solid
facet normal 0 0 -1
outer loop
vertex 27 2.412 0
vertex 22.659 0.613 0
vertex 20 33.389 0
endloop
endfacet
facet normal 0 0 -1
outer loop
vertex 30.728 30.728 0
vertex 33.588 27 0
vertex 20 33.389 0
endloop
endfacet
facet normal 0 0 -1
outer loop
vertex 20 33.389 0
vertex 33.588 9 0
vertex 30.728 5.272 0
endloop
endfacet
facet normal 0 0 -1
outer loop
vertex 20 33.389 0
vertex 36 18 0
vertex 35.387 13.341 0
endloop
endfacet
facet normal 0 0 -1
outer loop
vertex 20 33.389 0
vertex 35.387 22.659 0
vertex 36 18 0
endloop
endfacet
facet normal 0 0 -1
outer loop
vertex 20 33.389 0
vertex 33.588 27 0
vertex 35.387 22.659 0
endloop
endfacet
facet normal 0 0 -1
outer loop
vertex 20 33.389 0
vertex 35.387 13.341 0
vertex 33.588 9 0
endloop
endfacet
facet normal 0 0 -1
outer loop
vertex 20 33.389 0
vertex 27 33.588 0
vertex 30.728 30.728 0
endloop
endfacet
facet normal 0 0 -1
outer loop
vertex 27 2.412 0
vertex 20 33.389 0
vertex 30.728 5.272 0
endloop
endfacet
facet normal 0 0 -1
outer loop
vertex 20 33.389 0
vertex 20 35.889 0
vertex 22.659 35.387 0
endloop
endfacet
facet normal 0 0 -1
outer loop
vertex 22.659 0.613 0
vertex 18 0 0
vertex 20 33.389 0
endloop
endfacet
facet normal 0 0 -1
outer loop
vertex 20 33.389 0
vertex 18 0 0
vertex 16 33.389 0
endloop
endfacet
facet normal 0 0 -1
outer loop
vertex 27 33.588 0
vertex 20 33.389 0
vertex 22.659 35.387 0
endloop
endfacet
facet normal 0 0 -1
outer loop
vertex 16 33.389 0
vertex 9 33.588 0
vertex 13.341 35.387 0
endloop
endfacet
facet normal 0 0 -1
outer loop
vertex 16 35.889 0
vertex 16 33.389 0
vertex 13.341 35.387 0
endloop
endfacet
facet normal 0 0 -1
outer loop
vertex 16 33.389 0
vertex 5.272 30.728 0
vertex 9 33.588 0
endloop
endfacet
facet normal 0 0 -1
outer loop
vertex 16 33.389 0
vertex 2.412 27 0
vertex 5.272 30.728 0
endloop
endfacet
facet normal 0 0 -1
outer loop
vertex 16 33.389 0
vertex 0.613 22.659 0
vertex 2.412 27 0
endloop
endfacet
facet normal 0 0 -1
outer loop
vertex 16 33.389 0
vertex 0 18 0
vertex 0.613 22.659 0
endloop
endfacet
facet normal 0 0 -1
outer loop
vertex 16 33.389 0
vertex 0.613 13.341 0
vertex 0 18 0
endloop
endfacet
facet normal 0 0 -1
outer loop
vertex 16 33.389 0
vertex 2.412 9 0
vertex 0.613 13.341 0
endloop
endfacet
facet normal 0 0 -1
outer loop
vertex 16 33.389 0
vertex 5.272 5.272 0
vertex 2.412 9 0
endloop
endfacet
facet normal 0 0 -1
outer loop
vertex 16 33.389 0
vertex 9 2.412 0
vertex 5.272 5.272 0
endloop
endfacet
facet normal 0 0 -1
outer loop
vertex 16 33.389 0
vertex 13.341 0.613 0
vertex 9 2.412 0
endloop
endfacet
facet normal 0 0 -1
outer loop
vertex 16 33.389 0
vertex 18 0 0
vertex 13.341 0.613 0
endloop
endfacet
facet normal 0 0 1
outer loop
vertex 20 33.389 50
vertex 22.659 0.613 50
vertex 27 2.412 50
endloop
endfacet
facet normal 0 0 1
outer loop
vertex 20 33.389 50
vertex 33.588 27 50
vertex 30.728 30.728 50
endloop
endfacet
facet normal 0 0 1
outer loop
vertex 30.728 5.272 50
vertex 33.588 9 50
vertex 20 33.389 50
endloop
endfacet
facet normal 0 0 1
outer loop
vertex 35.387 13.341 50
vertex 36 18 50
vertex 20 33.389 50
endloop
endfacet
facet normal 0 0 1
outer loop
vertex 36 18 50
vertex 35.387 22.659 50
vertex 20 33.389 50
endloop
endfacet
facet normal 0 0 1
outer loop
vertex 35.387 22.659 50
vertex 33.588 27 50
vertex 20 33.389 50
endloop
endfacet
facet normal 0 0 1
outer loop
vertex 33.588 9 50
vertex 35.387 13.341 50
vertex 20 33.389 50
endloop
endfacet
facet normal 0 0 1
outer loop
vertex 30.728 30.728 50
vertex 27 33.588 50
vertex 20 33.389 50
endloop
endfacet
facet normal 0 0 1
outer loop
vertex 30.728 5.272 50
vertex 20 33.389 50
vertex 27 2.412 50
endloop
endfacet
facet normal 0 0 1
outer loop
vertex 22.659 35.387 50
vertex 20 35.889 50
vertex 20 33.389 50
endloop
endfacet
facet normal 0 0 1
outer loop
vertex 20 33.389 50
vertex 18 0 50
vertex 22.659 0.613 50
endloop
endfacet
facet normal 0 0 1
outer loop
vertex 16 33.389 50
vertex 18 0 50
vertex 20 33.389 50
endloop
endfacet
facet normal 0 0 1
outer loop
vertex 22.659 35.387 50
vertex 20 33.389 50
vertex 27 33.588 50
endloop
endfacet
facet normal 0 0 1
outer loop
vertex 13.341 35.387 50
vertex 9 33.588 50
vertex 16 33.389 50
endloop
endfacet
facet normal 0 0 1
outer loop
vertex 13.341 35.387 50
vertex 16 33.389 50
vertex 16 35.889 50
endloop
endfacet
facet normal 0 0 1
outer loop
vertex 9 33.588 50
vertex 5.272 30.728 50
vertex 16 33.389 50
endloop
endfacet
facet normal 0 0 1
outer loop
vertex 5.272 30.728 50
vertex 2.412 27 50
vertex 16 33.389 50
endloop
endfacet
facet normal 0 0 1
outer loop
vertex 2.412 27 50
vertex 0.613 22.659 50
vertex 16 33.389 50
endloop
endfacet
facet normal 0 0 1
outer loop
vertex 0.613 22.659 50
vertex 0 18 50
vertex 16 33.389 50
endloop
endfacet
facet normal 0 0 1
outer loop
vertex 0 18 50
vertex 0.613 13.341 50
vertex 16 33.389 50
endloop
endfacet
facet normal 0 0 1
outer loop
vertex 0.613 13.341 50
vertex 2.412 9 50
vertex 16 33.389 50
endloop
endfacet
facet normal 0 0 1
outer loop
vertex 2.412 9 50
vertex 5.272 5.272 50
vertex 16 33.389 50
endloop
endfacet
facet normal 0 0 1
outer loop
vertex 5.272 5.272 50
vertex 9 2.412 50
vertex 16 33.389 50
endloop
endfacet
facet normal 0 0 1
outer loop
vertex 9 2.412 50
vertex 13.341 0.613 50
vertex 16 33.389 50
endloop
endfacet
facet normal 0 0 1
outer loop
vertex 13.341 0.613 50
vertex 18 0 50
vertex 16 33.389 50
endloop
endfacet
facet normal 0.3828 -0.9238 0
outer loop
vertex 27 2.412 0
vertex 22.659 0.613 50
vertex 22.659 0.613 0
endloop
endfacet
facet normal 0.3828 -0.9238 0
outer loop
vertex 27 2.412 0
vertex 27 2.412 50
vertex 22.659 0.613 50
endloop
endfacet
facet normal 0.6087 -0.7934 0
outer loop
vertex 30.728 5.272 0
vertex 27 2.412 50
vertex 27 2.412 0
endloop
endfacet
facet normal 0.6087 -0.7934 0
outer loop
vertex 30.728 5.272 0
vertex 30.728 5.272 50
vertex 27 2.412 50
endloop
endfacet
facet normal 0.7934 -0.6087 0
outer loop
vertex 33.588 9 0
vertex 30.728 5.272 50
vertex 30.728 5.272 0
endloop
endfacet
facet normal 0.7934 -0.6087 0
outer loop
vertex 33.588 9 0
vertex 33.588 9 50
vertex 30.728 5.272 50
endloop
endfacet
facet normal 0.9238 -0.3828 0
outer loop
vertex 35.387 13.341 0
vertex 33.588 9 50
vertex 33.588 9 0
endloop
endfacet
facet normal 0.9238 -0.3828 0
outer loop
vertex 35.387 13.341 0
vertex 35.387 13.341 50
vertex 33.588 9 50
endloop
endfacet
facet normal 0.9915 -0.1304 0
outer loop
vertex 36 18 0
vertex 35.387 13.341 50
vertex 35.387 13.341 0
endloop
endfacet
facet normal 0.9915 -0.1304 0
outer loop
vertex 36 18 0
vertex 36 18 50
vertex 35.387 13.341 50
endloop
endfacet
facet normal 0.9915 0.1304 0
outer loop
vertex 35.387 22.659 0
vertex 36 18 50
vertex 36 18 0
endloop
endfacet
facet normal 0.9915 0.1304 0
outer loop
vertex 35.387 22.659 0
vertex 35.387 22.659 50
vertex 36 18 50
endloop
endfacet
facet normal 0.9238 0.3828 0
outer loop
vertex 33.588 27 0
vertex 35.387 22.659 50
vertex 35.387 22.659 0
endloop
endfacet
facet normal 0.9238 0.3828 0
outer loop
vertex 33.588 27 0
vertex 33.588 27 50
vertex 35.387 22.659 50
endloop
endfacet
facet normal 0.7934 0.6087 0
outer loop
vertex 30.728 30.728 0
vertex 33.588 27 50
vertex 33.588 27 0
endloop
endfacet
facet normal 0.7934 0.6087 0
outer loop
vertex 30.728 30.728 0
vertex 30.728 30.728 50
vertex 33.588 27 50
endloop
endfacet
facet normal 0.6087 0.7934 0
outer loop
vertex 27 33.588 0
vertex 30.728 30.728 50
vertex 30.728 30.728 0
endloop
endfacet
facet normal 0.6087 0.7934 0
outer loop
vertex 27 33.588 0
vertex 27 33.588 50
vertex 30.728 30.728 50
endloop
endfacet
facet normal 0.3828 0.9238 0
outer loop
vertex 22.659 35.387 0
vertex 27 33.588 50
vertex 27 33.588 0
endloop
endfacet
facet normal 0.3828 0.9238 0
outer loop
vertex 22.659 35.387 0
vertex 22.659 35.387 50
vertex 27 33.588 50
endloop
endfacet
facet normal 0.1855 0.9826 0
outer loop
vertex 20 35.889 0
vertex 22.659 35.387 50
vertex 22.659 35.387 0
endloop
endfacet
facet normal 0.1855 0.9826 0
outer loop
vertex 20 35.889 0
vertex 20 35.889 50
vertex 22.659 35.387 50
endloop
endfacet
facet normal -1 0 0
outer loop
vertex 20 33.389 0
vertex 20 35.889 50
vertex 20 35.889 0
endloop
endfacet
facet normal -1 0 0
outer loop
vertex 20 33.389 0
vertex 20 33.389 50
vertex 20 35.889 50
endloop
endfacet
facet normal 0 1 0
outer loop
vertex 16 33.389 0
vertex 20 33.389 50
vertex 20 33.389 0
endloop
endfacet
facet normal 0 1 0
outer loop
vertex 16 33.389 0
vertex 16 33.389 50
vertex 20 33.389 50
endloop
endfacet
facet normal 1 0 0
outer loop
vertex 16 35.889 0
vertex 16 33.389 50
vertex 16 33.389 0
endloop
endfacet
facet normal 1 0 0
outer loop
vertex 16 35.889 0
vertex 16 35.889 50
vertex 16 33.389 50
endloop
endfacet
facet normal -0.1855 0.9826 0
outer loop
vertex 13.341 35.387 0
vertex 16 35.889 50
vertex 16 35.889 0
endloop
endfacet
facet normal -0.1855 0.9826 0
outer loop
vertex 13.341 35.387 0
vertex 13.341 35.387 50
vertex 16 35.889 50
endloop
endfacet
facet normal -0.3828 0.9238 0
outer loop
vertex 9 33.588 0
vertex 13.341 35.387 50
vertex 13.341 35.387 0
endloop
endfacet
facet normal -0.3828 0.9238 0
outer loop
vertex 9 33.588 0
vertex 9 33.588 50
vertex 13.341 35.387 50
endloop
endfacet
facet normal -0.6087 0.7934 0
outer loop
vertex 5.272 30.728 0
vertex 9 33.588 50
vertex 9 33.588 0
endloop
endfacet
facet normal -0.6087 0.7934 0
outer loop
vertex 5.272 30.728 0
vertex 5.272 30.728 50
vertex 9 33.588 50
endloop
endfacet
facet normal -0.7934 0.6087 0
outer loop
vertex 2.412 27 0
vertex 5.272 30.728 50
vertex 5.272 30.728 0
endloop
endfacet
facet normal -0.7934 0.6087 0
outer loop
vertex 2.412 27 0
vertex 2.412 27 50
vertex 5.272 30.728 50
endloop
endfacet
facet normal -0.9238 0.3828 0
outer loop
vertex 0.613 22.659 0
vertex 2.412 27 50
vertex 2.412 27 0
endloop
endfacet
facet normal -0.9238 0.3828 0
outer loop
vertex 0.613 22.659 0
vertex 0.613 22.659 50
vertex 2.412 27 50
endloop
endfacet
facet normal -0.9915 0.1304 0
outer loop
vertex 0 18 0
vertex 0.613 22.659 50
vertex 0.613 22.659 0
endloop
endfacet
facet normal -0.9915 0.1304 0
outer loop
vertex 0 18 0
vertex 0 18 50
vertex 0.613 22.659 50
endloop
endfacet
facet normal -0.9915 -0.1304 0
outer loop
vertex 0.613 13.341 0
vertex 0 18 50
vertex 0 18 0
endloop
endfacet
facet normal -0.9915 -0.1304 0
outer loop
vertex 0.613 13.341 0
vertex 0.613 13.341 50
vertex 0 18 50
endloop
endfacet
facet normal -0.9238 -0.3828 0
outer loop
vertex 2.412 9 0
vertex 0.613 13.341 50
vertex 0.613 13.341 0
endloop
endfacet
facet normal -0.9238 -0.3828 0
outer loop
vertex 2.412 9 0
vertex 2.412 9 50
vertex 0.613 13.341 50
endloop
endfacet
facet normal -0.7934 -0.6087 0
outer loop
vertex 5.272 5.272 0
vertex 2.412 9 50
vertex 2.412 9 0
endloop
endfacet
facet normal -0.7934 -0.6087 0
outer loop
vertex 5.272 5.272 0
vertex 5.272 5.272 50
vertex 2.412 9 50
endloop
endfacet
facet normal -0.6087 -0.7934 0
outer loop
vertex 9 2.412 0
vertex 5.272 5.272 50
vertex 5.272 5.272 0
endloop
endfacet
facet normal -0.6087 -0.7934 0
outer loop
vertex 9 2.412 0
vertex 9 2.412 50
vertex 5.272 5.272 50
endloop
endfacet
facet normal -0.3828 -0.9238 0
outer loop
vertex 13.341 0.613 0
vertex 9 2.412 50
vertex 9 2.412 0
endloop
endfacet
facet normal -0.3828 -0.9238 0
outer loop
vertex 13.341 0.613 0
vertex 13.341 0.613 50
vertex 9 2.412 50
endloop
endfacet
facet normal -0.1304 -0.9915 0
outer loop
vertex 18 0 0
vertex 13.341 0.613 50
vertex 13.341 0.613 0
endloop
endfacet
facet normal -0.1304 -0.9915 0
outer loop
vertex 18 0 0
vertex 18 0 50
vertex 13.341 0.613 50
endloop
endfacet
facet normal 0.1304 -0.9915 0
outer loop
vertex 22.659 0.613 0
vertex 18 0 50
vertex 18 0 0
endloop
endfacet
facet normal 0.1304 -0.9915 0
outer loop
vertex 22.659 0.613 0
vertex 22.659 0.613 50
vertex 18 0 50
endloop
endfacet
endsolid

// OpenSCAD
$fn = 32;

// ----------------------------------------------------------------------
// Keyway shaft: d36 shaft, key 4 x 2.5 mm
// ----------------------------------------------------------------------

// --- parameters (mm) ---
shaft_r = 18;             // shaft radius
key_w = 4;                // keyway width
key_d = 2.5;              // keyway depth below the surface line
plate_t = 50;             // shaft length, Z (extrusion height)

shaft_d = 2 * shaft_r;  // shaft diameter
circle_step = 15;  // polygon sampling step, degrees

profile = [[13.341, 35.387], [9, 33.588], [5.272, 30.728], [2.412, 27], [0.613, 22.659], [0, 18], [0.613, 13.341], [2.412, 9], [5.272, 5.272], [9, 2.412], [13.341, 0.613], [18, 0], [22.659, 0.613], [27, 2.412], [30.728, 5.272], [33.588, 9], [35.387, 13.341], [36, 18], [35.387, 22.659], [33.588, 27], [30.728, 30.728], [27, 33.588], [22.659, 35.387], [20, 35.889], [20, 33.389], [16, 33.389], [16, 35.889]];  // primary outline, 27 points, counter clockwise

// --- the one profile operation ---
linear_extrude(height = plate_t) polygon(points = profile);
